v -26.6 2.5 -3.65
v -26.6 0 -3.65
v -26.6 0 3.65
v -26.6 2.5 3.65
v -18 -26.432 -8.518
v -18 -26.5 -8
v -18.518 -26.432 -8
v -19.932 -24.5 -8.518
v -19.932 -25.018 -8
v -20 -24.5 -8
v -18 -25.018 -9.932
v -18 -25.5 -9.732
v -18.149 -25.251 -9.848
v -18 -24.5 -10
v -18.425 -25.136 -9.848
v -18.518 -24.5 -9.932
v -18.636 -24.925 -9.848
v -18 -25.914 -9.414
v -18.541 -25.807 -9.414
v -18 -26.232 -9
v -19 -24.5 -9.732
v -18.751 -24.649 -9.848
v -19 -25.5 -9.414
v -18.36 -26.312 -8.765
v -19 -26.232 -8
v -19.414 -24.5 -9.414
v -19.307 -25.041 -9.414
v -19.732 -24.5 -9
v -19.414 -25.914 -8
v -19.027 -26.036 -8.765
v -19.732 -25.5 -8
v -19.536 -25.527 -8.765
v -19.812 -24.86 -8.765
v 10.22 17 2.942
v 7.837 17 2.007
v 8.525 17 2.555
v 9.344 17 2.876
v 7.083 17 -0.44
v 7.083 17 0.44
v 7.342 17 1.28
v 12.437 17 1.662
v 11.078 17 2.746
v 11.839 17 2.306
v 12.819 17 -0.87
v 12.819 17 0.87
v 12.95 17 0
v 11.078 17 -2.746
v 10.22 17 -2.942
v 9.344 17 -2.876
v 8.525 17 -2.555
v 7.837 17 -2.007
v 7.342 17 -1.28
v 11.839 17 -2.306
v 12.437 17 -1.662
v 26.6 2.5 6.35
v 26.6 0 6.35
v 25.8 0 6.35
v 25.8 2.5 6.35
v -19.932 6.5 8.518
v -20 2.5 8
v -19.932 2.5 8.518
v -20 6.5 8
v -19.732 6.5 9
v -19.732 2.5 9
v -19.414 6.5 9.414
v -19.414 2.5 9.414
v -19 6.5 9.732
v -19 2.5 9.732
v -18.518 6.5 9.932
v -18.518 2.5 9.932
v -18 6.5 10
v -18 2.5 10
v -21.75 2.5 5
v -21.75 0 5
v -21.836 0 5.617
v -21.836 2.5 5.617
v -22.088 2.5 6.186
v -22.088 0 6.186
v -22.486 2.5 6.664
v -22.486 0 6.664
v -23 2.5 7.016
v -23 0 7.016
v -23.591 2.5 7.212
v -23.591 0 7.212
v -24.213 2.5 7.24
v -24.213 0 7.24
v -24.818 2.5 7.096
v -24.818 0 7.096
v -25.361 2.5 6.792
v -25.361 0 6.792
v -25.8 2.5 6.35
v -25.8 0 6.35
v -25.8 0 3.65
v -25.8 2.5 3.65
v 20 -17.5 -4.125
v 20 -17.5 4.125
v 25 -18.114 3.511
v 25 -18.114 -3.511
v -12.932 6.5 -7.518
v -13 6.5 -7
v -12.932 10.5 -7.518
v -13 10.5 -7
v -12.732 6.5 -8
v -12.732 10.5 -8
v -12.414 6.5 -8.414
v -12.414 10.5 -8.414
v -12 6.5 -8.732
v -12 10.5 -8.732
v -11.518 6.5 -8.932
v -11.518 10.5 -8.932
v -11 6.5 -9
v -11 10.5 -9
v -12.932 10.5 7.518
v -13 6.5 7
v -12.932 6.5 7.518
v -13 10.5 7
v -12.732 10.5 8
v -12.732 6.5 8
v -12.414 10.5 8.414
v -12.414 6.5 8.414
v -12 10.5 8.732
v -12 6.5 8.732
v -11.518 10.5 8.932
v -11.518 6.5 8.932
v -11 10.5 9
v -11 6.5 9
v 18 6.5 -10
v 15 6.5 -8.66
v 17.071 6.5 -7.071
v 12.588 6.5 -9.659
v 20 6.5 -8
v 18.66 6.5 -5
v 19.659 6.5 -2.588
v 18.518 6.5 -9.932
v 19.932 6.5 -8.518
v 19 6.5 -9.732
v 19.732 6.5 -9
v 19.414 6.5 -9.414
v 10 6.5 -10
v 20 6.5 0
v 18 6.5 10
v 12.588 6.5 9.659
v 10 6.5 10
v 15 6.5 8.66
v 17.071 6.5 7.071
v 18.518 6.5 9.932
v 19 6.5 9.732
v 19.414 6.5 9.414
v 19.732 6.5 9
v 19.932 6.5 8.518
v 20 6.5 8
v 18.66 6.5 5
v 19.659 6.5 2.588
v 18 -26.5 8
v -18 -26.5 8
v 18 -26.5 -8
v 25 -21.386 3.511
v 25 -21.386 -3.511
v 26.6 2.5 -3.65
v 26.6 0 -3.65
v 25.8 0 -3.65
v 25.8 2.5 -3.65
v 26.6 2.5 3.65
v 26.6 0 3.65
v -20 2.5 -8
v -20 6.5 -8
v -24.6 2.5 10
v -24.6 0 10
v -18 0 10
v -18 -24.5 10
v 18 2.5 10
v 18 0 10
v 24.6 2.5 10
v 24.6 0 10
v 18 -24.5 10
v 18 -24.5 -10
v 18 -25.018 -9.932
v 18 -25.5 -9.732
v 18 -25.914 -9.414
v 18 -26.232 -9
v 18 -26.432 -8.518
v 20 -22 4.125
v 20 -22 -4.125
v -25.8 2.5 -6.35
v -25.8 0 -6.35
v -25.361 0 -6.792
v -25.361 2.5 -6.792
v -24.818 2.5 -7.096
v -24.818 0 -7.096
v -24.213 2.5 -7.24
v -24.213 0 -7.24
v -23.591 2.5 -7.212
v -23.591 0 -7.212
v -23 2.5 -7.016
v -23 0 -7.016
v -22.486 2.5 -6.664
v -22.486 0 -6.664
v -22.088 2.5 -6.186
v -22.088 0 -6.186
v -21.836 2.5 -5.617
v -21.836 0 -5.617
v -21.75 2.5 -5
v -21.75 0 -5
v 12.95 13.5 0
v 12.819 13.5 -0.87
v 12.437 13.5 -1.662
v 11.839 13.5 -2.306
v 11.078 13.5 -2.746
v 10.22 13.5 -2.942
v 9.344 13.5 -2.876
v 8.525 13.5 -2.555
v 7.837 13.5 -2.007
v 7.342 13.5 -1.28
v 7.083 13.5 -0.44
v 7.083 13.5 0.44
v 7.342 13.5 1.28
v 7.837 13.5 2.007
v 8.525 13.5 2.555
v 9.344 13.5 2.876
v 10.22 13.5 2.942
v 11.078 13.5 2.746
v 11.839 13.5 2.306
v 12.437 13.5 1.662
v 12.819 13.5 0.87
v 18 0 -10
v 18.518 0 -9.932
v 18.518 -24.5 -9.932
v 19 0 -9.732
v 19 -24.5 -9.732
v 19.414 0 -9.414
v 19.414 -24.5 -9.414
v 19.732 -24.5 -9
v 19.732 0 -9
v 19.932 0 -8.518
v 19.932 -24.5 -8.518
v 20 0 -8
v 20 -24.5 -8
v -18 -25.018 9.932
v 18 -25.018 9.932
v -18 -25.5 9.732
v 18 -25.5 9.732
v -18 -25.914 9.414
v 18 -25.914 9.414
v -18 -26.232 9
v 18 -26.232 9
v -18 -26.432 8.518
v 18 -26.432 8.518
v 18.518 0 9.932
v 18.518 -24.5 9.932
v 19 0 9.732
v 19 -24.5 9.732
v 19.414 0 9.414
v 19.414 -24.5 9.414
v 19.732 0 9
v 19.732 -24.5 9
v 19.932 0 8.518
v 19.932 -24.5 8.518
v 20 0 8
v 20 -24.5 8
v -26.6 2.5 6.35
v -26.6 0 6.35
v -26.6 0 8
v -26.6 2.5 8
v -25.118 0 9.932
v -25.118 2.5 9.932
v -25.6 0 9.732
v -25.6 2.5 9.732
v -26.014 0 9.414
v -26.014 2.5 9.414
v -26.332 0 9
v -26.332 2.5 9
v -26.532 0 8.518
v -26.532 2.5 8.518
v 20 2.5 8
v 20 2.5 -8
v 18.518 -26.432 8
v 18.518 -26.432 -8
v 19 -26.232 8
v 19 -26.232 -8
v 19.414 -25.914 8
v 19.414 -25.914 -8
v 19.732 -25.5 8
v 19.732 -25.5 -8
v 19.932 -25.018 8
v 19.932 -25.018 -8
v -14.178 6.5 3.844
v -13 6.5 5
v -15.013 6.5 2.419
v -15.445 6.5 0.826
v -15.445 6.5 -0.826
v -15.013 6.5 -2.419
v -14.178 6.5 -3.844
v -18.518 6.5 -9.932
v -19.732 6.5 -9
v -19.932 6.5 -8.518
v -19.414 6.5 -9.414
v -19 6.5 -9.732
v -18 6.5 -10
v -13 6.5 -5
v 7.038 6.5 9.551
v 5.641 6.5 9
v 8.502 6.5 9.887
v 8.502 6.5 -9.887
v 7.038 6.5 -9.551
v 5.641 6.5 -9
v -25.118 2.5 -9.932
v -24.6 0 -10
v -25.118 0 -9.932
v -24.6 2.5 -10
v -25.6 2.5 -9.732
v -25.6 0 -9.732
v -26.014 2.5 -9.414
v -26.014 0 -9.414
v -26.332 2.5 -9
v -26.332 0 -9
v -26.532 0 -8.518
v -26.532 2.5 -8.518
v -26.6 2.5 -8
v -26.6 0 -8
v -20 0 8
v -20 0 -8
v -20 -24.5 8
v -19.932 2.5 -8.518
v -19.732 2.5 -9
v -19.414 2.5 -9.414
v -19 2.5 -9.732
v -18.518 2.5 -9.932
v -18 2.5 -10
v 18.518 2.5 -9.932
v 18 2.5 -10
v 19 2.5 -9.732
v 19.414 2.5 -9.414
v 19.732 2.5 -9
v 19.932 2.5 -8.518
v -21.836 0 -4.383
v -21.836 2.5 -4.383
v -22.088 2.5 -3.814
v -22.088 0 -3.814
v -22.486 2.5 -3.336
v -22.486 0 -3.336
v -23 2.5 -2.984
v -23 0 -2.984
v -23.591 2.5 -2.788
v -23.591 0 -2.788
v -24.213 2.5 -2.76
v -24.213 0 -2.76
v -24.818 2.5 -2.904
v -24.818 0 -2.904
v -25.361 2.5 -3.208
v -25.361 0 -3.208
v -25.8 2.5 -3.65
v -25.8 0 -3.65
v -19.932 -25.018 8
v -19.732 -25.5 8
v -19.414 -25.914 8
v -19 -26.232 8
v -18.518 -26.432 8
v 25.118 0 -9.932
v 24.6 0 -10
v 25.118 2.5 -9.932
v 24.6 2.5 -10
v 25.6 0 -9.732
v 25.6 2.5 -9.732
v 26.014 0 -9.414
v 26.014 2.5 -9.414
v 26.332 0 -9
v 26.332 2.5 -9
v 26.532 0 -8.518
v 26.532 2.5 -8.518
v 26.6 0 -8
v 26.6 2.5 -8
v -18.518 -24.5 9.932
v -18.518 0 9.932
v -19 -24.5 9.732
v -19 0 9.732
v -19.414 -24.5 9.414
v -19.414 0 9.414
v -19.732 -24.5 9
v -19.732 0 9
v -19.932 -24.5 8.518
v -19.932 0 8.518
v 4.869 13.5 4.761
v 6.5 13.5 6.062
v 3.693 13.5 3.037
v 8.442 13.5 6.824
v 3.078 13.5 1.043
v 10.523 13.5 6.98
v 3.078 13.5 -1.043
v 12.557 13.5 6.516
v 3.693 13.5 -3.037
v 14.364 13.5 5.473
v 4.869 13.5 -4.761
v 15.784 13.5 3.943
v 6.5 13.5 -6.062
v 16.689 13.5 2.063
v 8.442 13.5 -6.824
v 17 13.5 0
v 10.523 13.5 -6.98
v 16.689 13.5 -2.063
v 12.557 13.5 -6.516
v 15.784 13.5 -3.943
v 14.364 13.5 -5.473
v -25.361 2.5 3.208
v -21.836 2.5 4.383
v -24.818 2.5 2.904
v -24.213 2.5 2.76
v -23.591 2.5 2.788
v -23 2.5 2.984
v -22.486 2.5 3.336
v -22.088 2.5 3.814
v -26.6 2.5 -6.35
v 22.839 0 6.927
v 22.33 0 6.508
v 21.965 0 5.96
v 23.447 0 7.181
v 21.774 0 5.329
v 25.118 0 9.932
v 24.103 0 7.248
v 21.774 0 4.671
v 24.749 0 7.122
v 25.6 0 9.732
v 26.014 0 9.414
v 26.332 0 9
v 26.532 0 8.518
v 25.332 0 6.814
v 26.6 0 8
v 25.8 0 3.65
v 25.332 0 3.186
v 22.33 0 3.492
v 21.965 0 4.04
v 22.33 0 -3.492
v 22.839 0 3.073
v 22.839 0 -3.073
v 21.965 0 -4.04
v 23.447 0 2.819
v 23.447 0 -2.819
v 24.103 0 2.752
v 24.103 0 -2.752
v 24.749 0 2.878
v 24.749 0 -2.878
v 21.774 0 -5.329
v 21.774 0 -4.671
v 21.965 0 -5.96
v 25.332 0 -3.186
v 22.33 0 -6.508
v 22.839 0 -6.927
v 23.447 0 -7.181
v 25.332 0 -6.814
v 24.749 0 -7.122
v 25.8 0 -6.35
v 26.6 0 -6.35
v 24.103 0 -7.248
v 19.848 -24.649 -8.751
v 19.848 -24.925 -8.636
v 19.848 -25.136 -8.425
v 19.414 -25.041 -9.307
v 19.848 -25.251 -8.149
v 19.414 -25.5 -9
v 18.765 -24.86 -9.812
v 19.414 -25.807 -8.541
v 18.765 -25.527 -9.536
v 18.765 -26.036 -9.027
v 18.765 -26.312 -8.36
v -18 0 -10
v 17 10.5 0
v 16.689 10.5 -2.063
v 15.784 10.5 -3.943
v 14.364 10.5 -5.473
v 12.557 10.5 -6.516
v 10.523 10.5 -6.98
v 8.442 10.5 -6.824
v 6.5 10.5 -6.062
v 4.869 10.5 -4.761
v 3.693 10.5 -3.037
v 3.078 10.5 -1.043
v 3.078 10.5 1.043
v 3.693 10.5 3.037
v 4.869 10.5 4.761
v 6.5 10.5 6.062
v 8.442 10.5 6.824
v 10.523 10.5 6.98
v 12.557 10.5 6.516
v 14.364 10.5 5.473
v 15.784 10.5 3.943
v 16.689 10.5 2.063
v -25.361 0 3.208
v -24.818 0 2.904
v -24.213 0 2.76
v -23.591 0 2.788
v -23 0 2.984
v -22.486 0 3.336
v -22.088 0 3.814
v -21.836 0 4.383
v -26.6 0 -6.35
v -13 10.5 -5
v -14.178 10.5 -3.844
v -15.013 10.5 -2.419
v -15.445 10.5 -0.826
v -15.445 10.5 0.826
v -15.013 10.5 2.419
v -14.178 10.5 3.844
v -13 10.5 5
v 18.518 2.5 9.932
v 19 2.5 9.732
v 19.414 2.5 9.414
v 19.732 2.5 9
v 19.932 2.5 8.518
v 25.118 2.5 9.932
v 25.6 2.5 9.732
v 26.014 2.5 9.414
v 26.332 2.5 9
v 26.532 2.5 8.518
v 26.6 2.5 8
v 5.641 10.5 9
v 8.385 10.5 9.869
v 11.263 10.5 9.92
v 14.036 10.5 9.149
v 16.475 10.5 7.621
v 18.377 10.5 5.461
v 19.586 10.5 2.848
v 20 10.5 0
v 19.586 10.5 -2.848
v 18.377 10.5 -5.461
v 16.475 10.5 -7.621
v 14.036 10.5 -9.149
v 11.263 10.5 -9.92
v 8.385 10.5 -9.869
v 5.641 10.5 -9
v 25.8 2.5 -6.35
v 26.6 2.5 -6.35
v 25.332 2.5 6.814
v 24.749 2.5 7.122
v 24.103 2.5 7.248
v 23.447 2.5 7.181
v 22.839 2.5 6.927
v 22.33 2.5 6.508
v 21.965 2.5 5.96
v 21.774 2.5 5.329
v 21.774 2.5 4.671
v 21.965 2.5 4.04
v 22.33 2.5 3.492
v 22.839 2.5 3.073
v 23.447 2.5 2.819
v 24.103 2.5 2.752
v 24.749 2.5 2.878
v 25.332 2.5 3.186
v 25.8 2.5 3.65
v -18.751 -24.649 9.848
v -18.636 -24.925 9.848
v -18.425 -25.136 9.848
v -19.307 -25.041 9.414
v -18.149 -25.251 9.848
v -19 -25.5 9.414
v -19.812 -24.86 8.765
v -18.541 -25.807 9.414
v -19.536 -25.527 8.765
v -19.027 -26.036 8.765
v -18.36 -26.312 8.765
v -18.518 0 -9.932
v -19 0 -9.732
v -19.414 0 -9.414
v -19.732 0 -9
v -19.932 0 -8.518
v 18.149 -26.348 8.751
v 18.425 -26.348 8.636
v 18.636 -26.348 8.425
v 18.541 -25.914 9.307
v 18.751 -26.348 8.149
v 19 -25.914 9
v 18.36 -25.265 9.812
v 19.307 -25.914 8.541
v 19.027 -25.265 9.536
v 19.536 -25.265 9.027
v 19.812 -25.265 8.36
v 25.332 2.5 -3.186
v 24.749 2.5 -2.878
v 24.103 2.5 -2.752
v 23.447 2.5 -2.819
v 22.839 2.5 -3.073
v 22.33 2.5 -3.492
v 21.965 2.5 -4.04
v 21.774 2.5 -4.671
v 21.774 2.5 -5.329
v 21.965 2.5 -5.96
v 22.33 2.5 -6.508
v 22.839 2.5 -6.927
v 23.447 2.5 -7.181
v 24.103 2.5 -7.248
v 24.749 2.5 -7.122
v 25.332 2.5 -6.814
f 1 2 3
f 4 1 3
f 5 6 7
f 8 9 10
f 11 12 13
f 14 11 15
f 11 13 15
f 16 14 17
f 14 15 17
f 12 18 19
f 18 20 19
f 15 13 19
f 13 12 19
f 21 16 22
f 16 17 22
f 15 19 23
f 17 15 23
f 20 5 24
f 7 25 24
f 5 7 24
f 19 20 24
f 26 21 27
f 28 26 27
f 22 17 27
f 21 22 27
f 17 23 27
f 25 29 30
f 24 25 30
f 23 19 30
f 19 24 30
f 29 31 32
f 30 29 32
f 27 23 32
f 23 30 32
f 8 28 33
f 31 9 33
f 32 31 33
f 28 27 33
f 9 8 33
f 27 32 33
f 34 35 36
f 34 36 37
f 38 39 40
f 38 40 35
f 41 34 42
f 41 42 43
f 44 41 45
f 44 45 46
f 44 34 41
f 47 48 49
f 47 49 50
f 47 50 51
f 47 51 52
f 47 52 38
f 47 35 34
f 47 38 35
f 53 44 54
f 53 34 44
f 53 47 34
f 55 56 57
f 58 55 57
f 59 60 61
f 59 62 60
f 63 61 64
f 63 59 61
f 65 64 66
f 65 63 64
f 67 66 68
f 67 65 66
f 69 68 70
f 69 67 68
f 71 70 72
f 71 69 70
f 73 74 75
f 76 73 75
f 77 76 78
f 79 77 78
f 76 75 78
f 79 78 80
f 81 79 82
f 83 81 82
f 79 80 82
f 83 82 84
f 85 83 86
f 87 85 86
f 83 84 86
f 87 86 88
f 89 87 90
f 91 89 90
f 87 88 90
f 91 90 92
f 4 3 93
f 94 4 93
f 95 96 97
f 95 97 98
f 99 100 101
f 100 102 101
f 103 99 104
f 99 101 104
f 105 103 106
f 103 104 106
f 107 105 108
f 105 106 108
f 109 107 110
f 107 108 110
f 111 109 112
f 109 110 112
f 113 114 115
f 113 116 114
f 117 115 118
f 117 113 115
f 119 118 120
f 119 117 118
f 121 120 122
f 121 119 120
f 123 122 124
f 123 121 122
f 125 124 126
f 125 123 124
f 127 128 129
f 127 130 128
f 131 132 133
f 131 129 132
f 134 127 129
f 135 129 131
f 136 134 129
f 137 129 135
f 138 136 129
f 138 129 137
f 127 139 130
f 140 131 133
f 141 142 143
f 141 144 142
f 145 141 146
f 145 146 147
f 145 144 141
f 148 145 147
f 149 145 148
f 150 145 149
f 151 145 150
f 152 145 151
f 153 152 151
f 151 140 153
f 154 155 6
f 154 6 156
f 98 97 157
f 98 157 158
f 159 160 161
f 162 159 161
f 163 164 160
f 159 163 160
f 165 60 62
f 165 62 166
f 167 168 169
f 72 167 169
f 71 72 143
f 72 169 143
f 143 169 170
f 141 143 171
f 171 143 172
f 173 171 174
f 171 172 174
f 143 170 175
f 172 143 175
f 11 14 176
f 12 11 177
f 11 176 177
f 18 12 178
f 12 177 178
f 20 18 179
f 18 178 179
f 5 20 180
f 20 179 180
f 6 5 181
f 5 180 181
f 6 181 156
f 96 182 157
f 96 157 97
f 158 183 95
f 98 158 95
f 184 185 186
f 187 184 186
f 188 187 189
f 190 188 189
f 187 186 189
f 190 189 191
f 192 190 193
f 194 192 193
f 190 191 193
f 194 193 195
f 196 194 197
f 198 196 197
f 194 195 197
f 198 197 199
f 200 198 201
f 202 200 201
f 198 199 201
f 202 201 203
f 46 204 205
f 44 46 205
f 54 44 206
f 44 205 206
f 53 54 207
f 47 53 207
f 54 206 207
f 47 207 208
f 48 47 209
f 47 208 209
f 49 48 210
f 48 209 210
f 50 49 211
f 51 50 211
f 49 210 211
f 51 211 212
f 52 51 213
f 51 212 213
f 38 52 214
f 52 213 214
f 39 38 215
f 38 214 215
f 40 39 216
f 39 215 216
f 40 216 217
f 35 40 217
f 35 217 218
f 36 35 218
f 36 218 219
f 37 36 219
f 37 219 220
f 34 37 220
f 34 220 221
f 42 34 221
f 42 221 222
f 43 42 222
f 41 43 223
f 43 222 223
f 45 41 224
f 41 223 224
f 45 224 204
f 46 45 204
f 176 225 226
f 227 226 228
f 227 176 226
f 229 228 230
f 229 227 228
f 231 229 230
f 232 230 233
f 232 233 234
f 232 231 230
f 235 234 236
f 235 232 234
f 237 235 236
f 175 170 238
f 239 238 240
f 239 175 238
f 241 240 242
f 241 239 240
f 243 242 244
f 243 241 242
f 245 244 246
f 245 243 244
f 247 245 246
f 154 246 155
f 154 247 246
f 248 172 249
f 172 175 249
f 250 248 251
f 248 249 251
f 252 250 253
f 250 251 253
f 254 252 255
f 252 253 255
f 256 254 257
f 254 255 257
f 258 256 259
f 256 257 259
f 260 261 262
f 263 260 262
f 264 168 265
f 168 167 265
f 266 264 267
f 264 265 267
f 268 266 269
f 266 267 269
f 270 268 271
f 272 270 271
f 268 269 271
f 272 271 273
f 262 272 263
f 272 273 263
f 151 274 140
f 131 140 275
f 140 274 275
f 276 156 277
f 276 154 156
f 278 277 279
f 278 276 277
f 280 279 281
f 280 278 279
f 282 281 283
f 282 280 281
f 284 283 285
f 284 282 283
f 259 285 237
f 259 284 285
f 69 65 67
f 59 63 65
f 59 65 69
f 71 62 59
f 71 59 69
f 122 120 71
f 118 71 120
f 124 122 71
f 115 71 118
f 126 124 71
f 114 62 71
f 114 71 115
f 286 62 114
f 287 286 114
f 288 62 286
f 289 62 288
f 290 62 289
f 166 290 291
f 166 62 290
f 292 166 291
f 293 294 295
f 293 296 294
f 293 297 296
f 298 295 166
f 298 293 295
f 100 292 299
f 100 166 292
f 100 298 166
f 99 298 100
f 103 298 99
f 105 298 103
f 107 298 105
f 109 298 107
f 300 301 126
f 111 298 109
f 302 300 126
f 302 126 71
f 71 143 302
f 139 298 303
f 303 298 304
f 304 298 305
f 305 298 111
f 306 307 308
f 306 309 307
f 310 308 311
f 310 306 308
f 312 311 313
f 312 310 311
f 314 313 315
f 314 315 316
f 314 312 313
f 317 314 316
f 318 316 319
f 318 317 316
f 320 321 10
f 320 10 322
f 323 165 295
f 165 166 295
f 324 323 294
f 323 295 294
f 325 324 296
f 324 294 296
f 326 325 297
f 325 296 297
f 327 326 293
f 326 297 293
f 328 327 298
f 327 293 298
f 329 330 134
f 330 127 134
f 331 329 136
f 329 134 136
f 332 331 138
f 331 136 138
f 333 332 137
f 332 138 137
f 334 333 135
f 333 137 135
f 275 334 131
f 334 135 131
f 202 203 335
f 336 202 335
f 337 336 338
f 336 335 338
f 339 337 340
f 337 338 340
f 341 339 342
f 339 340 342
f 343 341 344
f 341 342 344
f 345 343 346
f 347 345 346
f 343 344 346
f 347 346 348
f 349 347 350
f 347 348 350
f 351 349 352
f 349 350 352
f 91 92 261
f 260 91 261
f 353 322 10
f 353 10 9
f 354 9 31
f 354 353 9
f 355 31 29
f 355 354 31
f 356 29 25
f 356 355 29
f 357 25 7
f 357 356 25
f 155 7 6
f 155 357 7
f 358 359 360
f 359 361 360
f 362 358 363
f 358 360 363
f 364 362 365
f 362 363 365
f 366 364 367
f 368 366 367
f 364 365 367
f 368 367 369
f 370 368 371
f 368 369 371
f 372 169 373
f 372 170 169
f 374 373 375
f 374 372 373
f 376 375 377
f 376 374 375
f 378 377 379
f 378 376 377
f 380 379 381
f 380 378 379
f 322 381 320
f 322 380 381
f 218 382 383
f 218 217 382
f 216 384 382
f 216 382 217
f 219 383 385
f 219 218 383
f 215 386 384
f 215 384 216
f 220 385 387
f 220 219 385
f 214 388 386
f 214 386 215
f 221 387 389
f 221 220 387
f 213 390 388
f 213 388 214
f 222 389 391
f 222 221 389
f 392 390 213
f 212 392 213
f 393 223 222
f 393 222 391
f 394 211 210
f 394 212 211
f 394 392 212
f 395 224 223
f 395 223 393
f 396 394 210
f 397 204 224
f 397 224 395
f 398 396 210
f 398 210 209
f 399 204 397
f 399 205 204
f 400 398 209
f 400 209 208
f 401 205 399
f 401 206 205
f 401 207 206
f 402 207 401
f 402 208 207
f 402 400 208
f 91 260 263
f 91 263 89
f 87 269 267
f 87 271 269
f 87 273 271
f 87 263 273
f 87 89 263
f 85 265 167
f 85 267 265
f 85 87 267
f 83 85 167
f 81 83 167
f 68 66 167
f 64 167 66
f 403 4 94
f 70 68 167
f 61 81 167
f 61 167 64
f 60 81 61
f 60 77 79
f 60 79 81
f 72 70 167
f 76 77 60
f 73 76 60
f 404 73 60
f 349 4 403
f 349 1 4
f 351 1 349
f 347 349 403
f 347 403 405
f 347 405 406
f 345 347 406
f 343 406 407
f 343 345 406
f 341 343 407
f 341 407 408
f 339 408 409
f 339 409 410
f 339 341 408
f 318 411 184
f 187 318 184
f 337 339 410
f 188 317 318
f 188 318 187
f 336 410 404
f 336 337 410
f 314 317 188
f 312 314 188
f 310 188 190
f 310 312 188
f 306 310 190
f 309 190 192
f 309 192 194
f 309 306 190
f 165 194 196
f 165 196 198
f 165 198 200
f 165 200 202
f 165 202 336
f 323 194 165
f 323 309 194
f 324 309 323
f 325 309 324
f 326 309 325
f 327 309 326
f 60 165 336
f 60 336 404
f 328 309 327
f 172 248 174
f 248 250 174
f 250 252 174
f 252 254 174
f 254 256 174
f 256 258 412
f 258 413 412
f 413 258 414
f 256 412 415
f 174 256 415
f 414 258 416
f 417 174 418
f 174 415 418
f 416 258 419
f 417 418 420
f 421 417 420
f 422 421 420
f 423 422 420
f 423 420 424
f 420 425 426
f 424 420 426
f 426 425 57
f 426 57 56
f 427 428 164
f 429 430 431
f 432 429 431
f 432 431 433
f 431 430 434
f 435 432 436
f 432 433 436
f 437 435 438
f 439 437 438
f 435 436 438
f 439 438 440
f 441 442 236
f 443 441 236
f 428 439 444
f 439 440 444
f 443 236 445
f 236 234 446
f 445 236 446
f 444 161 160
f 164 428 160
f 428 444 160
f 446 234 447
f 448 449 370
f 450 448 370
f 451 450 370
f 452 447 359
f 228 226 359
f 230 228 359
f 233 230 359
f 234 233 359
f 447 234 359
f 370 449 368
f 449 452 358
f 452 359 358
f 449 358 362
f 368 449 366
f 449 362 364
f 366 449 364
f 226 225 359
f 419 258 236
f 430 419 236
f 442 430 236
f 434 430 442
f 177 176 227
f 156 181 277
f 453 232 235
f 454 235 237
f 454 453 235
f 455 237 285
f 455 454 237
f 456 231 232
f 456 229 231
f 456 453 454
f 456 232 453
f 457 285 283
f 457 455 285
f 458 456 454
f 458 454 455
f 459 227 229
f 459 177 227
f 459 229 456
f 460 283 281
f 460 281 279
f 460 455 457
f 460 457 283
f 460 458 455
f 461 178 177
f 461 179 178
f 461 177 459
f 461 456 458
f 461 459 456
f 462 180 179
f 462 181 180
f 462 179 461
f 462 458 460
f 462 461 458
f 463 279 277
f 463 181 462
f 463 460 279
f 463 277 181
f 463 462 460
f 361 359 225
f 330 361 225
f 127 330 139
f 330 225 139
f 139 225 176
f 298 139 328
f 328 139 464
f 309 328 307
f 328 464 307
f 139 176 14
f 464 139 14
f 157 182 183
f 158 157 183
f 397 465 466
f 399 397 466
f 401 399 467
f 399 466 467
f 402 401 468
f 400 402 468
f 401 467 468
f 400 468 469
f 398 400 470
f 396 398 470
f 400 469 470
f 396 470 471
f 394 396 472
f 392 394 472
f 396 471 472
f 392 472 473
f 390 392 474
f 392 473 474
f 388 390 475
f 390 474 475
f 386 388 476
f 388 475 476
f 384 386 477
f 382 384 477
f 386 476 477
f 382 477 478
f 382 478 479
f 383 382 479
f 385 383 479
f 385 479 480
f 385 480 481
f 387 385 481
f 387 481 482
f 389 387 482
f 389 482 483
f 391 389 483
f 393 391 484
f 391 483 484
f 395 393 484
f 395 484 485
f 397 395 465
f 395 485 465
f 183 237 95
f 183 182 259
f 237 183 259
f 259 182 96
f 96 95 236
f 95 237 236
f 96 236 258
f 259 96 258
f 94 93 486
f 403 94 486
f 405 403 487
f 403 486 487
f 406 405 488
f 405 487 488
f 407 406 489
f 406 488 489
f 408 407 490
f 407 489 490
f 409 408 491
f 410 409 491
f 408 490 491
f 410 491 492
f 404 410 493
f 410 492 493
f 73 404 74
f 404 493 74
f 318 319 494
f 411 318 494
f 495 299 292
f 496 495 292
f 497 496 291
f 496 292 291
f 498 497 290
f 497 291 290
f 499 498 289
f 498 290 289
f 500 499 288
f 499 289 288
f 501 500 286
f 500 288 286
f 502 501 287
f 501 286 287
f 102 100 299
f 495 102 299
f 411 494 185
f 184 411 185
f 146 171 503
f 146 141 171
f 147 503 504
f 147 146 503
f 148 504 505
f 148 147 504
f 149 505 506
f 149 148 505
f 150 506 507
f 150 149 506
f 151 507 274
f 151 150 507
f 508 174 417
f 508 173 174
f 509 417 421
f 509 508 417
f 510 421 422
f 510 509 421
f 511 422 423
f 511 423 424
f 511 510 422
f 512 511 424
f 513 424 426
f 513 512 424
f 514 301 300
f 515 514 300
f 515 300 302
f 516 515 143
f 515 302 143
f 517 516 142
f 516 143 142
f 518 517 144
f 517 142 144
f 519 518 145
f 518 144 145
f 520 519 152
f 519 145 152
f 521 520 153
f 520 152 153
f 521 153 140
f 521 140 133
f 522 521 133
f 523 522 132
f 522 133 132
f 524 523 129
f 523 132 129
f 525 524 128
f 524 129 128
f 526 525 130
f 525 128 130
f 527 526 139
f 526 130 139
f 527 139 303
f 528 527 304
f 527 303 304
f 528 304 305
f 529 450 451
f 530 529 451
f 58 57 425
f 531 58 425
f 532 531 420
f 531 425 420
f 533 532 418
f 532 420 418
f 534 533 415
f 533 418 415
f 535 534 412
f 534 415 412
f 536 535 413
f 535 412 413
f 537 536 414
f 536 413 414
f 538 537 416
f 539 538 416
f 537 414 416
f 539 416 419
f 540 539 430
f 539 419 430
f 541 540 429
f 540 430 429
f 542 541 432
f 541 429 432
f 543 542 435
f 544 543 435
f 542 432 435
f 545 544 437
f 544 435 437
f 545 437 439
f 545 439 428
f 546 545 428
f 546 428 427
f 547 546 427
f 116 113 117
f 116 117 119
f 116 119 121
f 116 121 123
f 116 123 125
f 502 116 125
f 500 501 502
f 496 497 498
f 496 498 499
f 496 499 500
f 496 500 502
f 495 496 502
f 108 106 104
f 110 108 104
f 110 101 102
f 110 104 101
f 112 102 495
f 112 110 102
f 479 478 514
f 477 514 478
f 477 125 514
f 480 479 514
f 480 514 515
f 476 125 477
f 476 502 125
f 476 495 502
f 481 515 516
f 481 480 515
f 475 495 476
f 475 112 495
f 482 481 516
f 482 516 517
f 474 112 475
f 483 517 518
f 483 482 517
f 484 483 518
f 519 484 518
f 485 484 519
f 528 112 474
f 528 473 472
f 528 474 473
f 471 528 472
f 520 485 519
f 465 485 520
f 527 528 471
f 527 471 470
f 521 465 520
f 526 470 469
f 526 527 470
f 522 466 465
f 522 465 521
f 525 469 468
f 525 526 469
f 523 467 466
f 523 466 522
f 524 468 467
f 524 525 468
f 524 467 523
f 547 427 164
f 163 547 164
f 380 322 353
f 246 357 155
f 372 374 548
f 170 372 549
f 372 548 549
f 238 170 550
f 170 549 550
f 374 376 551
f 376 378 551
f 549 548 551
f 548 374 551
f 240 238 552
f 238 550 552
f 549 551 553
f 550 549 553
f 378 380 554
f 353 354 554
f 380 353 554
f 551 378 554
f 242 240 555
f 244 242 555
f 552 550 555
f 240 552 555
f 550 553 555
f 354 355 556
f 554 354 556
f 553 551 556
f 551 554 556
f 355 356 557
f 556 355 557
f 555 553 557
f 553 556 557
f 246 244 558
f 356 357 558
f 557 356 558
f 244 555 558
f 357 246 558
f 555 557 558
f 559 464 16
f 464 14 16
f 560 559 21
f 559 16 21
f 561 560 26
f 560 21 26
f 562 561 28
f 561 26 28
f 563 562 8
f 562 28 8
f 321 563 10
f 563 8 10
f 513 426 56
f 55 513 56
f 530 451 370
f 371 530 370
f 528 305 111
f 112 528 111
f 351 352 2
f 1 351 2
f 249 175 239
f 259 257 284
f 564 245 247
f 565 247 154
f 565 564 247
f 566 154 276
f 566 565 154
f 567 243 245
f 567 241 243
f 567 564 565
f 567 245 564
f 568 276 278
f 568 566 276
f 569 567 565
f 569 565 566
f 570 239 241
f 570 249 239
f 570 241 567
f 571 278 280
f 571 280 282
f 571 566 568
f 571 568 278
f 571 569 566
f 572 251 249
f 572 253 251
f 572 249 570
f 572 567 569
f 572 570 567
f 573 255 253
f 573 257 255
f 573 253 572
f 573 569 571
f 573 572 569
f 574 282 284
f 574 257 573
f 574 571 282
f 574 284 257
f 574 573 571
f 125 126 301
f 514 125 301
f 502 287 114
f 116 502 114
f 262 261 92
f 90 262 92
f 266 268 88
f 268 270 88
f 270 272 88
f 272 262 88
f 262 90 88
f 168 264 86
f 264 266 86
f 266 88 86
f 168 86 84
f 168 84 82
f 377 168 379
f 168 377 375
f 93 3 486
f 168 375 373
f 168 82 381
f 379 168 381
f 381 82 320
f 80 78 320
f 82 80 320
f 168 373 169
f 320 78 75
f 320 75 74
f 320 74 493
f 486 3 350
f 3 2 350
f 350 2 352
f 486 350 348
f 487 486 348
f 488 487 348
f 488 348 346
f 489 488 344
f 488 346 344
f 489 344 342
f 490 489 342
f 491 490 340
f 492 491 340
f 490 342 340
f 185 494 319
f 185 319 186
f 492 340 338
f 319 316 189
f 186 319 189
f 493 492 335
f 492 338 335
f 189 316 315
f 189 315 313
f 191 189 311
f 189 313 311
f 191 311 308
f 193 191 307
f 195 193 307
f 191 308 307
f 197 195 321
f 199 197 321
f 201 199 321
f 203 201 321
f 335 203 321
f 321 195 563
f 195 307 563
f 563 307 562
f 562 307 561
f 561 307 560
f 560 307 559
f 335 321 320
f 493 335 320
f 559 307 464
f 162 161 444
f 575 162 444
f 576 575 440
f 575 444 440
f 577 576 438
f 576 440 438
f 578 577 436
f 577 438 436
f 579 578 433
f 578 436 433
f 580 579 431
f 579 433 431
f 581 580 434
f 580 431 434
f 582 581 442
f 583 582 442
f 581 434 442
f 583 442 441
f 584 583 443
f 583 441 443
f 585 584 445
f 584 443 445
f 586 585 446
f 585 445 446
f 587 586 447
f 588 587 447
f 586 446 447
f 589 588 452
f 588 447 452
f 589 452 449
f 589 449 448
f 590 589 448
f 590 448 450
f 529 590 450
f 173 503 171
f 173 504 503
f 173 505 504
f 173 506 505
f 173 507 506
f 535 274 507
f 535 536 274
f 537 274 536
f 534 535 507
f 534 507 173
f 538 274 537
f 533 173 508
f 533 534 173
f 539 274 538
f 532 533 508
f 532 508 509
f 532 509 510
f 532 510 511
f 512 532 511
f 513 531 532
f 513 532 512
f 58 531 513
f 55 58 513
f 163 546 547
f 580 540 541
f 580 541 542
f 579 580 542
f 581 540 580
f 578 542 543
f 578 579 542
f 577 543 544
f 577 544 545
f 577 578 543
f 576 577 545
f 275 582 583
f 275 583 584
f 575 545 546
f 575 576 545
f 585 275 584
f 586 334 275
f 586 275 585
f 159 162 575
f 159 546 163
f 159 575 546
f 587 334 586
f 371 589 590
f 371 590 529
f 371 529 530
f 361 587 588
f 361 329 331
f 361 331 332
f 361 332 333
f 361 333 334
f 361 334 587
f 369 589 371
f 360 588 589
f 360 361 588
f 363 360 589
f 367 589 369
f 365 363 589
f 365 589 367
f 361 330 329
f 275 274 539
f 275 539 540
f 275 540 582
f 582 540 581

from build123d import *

# Parameters (mm, degrees)
BOSS_EXTRUDE1_DEPTH = 2.5
SKETCH2_W           = 40
SKETCH2_H           = 20
BOSS_EXTRUDE2_DEPTH = 4
SKETCH3_W           = 40
SKETCH3_H           = 20
BOSS_EXTRUDE3_DEPTH = 26.5
BOSS_EXTRUDE4_DEPTH = 4
SKETCH5_R           = 7
BOSS_EXTRUDE5_DEPTH = 3
SKETCH6_R           = 2.95
BOSS_EXTRUDE6_DEPTH = 3.5
FILLET1_R           = 2
SKETCH7_W           = 8.25
SKETCH7_H           = 4.5
BOSS_EXTRUDE7_DEPTH = 5
DRAFT3_ANGLE        = 7


with BuildPart() as part:
    # Sketch1 → Boss-Extrude1 (new body)
    with BuildSketch(Plane(origin=(0, 0, 0), x_dir=(1, 0, 0), z_dir=(0, 1, 0))):
        with BuildLine():
            ThreePointArc((25.8, 3.65), (21.75, 5), (25.8, 6.35))
            Line((25.8, 6.35), (26.6, 6.35))
            Line((26.6, 6.35), (26.6, 10))
            Line((26.6, 10), (-26.6, 10))
            Line((-26.6, 10), (-26.6, 6.35))
            Line((-26.6, 6.35), (-25.8, 6.35))
            ThreePointArc((-25.8, 6.35), (-23.288487526, 7.134537421), (-21.75, 5))
            ThreePointArc((-21.75, 5), (-23.288487526, 2.865462579), (-25.8, 3.65))
            Line((-25.8, 3.65), (-26.6, 3.65))
            Line((-26.6, 3.65), (-26.6, -3.65))
            Line((-26.6, -3.65), (-25.8, -3.65))
            ThreePointArc((-25.8, -3.65), (-23.288487526, -2.865462579), (-21.75, -5))
            ThreePointArc((-21.75, -5), (-23.288487526, -7.134537421), (-25.8, -6.35))
            Line((-25.8, -6.35), (-26.6, -6.35))
            Line((-26.6, -6.35), (-26.6, -10))
            Line((-26.6, -10), (26.6, -10))
            Line((26.6, -10), (26.6, -6.35))
            Line((26.6, -6.35), (25.8, -6.35))
            ThreePointArc((25.8, -6.35), (21.75, -5), (25.8, -3.65))
            Line((25.8, -3.65), (26.6, -3.65))
            Line((26.6, -3.65), (26.6, 3.65))
            Line((26.6, 3.65), (25.8, 3.65))
        make_face()
    extrude(amount=BOSS_EXTRUDE1_DEPTH)

    # Sketch2 → Boss-Extrude2 (add)
    with BuildSketch(Plane(origin=(0, 2.5, 0), x_dir=(1, 0, 0), z_dir=(0, 1, 0))):
        Rectangle(SKETCH2_W, SKETCH2_H)
    extrude(amount=BOSS_EXTRUDE2_DEPTH)

    # Sketch3 → Boss-Extrude3 (add)
    with BuildSketch(Plane.XZ):
        Rectangle(SKETCH3_W, SKETCH3_H)
    extrude(amount=BOSS_EXTRUDE3_DEPTH)

    # Sketch4 → Boss-Extrude4 (add)
    with BuildSketch(Plane(origin=(0, 6.5, 0), x_dir=(1, 0, 0), z_dir=(0, 1, 0))):
        with BuildLine():
            ThreePointArc((5.641101056, -9), (0, 0), (5.641101056, 9))
            Line((5.641101056, 9), (-13, 9))
            Line((-13, 9), (-13, 5))
            Line((-13, 5), (-13, -5))
            Line((-13, -5), (-13, -9))
            Line((-13, -9), (5.641101056, -9))
        make_face()
        with BuildLine():
            ThreePointArc((20, 0), (15.310885546, 8.473163206), (5.641101056, 9))
            Line((5.641101056, 9), (5.641101056, -9))
            ThreePointArc((5.641101056, -9), (15.310885546, -8.473163206), (20, 0))
        make_face()
        with BuildLine():
            Line((5.641101056, -9), (5.641101056, 9))
            ThreePointArc((5.641101056, 9), (0, 0), (5.641101056, -9))
        make_face()
        with BuildLine():
            Line((-13, -5), (-13, 5))
            ThreePointArc((-13, 5), (-15.5, 0), (-13, -5))
        make_face()
    extrude(amount=BOSS_EXTRUDE4_DEPTH)

    # Sketch5 → Boss-Extrude5 (add)
    with BuildSketch(Plane(origin=(0, 10.5, 0), x_dir=(1, 0, 0), z_dir=(0, 1, 0))):
        with Locations((10, 0)):
            Circle(SKETCH5_R)
    extrude(amount=BOSS_EXTRUDE5_DEPTH)

    # Sketch6 → Boss-Extrude6 (add)
    with BuildSketch(Plane(origin=(0, 13.5, 0), x_dir=(1, 0, 0), z_dir=(0, 1, 0))):
        with Locations((10, 0)):
            Circle(SKETCH6_R)
    extrude(amount=BOSS_EXTRUDE6_DEPTH)

    # Fillet1
    fillet1_edges = [part.edges().sort_by_distance(p)[0] for p in [
        (-26.6, 1.25, -10),
        (26.6, 1.25, -10),
        (26.6, 1.25, 10),
        (-26.6, 1.25, 10),
        (-20, 4.5, -10),
        (-20, 4.5, 10),
        (20, 4.5, 10),
        (20, 4.5, -10),
        (20, -13.25, 10),
        (-20, -26.5, 0),
        (-20, -13.25, 10),
        (0, -26.5, -10),
        (-20, -13.25, -10),
        (20, -13.25, -10),
        (0, -26.5, 10),
        (20, -26.5, 0),
        (-13, 8.5, 9),
        (-13, 8.5, -9),
    ]]
    fillet(fillet1_edges, radius=FILLET1_R)

    # Sketch7 → Boss-Extrude7 (add)
    with BuildSketch(Plane(origin=(20, 0, 0), x_dir=(0, 0, -1), z_dir=(1, 0, 0))):
        with Locations((0, -19.75000011)):
            Rectangle(SKETCH7_W, SKETCH7_H)
    extrude(amount=BOSS_EXTRUDE7_DEPTH)

    # Draft3
    draft3_faces = [part.faces().sort_by_distance(p)[0] for p in [
        (22.5, -22.00000011, 0),
        (22.5, -19.75000011, 4.125),
        (22.5, -19.75000011, -4.125),
        (22.5, -17.50000011, 0),
    ]]
    draft(draft3_faces, Plane(origin=(20, -26.5, -10), x_dir=(0, 0, 1), z_dir=(1, 0, 0)), DRAFT3_ANGLE)


solid = part.part
